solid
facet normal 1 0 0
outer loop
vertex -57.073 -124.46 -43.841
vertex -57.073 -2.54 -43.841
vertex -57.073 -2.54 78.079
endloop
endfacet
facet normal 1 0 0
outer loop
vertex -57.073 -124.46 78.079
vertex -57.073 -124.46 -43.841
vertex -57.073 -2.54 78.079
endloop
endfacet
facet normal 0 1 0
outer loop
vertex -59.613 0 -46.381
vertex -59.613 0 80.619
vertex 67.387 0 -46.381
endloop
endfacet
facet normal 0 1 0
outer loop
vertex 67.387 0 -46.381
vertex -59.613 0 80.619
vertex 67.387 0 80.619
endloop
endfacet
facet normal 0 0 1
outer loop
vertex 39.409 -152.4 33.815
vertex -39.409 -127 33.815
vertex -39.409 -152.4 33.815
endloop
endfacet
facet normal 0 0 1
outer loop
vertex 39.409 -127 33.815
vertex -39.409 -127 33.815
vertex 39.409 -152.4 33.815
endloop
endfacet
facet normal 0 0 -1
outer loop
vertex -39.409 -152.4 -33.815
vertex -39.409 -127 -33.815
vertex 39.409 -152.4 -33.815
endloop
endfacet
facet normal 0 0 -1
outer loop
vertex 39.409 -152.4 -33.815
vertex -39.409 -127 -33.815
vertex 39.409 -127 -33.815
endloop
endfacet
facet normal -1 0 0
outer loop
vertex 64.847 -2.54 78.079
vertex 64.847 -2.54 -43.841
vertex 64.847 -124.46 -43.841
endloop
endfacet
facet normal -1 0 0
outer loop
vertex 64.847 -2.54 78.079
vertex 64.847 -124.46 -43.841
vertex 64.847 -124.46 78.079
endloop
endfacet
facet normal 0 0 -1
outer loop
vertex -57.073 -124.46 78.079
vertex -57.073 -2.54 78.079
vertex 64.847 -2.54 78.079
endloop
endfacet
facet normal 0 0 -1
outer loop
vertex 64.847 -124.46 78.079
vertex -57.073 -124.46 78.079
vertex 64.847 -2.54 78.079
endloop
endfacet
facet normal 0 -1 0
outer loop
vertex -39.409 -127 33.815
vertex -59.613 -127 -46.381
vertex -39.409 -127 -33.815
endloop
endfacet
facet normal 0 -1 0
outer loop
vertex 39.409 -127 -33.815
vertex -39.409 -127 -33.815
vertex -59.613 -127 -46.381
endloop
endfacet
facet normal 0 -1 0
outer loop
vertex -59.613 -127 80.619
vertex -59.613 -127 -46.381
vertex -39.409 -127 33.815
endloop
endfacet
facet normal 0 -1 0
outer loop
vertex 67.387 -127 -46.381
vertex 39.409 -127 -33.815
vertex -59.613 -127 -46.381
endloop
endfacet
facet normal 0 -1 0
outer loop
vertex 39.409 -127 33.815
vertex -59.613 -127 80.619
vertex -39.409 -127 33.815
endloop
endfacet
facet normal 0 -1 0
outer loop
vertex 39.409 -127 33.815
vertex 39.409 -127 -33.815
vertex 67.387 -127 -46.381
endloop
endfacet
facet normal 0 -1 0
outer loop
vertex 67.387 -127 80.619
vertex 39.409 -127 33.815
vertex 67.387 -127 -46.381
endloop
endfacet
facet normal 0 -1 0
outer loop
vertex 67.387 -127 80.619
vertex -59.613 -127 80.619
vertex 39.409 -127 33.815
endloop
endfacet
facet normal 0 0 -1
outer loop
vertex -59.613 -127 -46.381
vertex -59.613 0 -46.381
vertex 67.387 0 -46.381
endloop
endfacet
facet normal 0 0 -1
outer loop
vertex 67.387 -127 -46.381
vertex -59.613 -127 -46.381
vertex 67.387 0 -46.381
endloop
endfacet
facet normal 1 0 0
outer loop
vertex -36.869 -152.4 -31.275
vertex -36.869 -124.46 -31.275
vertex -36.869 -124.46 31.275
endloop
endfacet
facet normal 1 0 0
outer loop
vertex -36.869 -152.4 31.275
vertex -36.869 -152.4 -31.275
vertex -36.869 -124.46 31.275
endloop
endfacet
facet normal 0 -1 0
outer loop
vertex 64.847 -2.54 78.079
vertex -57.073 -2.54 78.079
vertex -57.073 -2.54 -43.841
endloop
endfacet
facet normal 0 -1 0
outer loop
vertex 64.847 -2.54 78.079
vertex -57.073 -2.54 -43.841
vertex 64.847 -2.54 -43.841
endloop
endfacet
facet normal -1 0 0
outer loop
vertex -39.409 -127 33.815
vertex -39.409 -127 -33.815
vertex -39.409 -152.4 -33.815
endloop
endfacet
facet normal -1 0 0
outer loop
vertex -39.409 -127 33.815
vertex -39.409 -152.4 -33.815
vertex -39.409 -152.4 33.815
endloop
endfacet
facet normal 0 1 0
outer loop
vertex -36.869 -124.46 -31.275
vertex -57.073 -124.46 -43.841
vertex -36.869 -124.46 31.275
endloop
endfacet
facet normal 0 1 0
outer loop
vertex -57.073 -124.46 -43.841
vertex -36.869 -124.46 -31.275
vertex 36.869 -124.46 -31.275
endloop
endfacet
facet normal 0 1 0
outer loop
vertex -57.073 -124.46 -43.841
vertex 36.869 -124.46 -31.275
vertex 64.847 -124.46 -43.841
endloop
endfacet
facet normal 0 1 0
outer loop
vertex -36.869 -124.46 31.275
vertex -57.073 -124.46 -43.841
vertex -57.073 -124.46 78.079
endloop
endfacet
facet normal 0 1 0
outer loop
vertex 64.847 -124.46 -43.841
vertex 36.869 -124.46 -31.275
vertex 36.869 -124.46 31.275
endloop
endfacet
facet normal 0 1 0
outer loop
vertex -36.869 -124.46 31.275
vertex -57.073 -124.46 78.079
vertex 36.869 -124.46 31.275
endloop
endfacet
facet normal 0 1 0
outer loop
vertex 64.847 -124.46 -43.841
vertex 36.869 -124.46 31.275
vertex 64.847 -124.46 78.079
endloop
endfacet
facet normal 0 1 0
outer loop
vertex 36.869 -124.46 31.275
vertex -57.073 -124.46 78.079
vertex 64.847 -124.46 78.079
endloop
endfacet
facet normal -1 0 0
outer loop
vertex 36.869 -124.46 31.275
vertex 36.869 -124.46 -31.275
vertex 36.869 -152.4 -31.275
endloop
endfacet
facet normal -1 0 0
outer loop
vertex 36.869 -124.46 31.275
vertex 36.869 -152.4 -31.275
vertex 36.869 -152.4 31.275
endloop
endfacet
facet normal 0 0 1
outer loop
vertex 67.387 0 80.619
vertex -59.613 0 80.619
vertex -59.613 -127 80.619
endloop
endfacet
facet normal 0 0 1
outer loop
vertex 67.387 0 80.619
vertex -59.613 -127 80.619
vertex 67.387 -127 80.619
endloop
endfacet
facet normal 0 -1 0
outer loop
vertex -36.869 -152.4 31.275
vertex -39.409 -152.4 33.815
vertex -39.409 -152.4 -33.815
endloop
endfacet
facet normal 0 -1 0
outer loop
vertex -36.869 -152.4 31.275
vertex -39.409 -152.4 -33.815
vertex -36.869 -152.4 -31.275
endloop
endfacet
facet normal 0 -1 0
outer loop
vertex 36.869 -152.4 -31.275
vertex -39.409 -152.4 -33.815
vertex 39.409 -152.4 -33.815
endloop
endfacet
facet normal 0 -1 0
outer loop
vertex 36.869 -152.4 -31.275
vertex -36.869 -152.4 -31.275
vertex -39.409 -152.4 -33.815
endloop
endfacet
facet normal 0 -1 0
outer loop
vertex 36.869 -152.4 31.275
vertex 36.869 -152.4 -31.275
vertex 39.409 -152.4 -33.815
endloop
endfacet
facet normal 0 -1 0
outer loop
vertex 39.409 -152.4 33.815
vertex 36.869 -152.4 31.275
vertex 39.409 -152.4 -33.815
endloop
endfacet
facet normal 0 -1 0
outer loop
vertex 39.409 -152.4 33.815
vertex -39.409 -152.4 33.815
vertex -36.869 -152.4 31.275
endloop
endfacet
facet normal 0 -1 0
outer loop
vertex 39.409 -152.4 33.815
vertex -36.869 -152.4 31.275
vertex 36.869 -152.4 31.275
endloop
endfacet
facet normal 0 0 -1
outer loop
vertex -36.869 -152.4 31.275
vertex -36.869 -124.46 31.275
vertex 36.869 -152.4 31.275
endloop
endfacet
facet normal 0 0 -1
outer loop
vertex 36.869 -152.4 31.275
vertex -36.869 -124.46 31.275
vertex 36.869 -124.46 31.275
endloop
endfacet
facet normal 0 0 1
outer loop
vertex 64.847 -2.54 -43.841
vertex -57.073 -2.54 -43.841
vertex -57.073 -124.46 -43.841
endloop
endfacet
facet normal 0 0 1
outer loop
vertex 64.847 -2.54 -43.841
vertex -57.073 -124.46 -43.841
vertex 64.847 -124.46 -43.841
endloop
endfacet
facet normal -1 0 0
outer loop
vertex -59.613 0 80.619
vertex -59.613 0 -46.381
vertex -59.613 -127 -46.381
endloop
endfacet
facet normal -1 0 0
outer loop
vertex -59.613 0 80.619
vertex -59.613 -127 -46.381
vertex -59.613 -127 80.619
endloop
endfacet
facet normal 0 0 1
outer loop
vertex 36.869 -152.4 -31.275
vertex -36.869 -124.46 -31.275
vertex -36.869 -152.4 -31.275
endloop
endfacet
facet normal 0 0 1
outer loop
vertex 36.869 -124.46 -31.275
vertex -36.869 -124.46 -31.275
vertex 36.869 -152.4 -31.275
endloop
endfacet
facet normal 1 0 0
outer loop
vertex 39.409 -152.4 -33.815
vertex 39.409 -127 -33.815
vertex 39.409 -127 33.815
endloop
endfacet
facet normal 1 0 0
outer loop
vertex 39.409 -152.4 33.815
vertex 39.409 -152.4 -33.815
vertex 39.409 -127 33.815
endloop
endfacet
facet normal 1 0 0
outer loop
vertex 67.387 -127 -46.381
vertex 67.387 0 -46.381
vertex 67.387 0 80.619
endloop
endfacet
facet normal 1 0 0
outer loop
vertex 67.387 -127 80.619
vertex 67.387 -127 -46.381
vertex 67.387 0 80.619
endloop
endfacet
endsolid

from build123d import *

# Parameters (mm, degrees)
F0_W     = 127
F0_H     = 127
F1_DEPTH = 127
F2_W     = 78.8183361292
F2_H     = 67.629866302
F3_DEPTH = 25.4
F4_T     = -2.54


with BuildPart() as f1:
    # F0 (on Front) → F1 (new body)
    with BuildSketch(Plane.XZ):
        with Locations((3.8867425174, 17.1191294668)):
            Rectangle(F0_W, F0_H)
    extrude(amount=F1_DEPTH)

    # F2 (on face) → F3 (join)
    with BuildSketch(Plane.XZ.offset(127)):
        Rectangle(F2_W, F2_H)
    extrude(amount=F3_DEPTH)

    # F4
    f4_openings = [f1.faces().sort_by_distance(p)[0] for p in [
        (0, -152.4, 0),
    ]]
    offset(amount=F4_T, openings=f4_openings, kind=Kind.INTERSECTION)


solid = f1.part
